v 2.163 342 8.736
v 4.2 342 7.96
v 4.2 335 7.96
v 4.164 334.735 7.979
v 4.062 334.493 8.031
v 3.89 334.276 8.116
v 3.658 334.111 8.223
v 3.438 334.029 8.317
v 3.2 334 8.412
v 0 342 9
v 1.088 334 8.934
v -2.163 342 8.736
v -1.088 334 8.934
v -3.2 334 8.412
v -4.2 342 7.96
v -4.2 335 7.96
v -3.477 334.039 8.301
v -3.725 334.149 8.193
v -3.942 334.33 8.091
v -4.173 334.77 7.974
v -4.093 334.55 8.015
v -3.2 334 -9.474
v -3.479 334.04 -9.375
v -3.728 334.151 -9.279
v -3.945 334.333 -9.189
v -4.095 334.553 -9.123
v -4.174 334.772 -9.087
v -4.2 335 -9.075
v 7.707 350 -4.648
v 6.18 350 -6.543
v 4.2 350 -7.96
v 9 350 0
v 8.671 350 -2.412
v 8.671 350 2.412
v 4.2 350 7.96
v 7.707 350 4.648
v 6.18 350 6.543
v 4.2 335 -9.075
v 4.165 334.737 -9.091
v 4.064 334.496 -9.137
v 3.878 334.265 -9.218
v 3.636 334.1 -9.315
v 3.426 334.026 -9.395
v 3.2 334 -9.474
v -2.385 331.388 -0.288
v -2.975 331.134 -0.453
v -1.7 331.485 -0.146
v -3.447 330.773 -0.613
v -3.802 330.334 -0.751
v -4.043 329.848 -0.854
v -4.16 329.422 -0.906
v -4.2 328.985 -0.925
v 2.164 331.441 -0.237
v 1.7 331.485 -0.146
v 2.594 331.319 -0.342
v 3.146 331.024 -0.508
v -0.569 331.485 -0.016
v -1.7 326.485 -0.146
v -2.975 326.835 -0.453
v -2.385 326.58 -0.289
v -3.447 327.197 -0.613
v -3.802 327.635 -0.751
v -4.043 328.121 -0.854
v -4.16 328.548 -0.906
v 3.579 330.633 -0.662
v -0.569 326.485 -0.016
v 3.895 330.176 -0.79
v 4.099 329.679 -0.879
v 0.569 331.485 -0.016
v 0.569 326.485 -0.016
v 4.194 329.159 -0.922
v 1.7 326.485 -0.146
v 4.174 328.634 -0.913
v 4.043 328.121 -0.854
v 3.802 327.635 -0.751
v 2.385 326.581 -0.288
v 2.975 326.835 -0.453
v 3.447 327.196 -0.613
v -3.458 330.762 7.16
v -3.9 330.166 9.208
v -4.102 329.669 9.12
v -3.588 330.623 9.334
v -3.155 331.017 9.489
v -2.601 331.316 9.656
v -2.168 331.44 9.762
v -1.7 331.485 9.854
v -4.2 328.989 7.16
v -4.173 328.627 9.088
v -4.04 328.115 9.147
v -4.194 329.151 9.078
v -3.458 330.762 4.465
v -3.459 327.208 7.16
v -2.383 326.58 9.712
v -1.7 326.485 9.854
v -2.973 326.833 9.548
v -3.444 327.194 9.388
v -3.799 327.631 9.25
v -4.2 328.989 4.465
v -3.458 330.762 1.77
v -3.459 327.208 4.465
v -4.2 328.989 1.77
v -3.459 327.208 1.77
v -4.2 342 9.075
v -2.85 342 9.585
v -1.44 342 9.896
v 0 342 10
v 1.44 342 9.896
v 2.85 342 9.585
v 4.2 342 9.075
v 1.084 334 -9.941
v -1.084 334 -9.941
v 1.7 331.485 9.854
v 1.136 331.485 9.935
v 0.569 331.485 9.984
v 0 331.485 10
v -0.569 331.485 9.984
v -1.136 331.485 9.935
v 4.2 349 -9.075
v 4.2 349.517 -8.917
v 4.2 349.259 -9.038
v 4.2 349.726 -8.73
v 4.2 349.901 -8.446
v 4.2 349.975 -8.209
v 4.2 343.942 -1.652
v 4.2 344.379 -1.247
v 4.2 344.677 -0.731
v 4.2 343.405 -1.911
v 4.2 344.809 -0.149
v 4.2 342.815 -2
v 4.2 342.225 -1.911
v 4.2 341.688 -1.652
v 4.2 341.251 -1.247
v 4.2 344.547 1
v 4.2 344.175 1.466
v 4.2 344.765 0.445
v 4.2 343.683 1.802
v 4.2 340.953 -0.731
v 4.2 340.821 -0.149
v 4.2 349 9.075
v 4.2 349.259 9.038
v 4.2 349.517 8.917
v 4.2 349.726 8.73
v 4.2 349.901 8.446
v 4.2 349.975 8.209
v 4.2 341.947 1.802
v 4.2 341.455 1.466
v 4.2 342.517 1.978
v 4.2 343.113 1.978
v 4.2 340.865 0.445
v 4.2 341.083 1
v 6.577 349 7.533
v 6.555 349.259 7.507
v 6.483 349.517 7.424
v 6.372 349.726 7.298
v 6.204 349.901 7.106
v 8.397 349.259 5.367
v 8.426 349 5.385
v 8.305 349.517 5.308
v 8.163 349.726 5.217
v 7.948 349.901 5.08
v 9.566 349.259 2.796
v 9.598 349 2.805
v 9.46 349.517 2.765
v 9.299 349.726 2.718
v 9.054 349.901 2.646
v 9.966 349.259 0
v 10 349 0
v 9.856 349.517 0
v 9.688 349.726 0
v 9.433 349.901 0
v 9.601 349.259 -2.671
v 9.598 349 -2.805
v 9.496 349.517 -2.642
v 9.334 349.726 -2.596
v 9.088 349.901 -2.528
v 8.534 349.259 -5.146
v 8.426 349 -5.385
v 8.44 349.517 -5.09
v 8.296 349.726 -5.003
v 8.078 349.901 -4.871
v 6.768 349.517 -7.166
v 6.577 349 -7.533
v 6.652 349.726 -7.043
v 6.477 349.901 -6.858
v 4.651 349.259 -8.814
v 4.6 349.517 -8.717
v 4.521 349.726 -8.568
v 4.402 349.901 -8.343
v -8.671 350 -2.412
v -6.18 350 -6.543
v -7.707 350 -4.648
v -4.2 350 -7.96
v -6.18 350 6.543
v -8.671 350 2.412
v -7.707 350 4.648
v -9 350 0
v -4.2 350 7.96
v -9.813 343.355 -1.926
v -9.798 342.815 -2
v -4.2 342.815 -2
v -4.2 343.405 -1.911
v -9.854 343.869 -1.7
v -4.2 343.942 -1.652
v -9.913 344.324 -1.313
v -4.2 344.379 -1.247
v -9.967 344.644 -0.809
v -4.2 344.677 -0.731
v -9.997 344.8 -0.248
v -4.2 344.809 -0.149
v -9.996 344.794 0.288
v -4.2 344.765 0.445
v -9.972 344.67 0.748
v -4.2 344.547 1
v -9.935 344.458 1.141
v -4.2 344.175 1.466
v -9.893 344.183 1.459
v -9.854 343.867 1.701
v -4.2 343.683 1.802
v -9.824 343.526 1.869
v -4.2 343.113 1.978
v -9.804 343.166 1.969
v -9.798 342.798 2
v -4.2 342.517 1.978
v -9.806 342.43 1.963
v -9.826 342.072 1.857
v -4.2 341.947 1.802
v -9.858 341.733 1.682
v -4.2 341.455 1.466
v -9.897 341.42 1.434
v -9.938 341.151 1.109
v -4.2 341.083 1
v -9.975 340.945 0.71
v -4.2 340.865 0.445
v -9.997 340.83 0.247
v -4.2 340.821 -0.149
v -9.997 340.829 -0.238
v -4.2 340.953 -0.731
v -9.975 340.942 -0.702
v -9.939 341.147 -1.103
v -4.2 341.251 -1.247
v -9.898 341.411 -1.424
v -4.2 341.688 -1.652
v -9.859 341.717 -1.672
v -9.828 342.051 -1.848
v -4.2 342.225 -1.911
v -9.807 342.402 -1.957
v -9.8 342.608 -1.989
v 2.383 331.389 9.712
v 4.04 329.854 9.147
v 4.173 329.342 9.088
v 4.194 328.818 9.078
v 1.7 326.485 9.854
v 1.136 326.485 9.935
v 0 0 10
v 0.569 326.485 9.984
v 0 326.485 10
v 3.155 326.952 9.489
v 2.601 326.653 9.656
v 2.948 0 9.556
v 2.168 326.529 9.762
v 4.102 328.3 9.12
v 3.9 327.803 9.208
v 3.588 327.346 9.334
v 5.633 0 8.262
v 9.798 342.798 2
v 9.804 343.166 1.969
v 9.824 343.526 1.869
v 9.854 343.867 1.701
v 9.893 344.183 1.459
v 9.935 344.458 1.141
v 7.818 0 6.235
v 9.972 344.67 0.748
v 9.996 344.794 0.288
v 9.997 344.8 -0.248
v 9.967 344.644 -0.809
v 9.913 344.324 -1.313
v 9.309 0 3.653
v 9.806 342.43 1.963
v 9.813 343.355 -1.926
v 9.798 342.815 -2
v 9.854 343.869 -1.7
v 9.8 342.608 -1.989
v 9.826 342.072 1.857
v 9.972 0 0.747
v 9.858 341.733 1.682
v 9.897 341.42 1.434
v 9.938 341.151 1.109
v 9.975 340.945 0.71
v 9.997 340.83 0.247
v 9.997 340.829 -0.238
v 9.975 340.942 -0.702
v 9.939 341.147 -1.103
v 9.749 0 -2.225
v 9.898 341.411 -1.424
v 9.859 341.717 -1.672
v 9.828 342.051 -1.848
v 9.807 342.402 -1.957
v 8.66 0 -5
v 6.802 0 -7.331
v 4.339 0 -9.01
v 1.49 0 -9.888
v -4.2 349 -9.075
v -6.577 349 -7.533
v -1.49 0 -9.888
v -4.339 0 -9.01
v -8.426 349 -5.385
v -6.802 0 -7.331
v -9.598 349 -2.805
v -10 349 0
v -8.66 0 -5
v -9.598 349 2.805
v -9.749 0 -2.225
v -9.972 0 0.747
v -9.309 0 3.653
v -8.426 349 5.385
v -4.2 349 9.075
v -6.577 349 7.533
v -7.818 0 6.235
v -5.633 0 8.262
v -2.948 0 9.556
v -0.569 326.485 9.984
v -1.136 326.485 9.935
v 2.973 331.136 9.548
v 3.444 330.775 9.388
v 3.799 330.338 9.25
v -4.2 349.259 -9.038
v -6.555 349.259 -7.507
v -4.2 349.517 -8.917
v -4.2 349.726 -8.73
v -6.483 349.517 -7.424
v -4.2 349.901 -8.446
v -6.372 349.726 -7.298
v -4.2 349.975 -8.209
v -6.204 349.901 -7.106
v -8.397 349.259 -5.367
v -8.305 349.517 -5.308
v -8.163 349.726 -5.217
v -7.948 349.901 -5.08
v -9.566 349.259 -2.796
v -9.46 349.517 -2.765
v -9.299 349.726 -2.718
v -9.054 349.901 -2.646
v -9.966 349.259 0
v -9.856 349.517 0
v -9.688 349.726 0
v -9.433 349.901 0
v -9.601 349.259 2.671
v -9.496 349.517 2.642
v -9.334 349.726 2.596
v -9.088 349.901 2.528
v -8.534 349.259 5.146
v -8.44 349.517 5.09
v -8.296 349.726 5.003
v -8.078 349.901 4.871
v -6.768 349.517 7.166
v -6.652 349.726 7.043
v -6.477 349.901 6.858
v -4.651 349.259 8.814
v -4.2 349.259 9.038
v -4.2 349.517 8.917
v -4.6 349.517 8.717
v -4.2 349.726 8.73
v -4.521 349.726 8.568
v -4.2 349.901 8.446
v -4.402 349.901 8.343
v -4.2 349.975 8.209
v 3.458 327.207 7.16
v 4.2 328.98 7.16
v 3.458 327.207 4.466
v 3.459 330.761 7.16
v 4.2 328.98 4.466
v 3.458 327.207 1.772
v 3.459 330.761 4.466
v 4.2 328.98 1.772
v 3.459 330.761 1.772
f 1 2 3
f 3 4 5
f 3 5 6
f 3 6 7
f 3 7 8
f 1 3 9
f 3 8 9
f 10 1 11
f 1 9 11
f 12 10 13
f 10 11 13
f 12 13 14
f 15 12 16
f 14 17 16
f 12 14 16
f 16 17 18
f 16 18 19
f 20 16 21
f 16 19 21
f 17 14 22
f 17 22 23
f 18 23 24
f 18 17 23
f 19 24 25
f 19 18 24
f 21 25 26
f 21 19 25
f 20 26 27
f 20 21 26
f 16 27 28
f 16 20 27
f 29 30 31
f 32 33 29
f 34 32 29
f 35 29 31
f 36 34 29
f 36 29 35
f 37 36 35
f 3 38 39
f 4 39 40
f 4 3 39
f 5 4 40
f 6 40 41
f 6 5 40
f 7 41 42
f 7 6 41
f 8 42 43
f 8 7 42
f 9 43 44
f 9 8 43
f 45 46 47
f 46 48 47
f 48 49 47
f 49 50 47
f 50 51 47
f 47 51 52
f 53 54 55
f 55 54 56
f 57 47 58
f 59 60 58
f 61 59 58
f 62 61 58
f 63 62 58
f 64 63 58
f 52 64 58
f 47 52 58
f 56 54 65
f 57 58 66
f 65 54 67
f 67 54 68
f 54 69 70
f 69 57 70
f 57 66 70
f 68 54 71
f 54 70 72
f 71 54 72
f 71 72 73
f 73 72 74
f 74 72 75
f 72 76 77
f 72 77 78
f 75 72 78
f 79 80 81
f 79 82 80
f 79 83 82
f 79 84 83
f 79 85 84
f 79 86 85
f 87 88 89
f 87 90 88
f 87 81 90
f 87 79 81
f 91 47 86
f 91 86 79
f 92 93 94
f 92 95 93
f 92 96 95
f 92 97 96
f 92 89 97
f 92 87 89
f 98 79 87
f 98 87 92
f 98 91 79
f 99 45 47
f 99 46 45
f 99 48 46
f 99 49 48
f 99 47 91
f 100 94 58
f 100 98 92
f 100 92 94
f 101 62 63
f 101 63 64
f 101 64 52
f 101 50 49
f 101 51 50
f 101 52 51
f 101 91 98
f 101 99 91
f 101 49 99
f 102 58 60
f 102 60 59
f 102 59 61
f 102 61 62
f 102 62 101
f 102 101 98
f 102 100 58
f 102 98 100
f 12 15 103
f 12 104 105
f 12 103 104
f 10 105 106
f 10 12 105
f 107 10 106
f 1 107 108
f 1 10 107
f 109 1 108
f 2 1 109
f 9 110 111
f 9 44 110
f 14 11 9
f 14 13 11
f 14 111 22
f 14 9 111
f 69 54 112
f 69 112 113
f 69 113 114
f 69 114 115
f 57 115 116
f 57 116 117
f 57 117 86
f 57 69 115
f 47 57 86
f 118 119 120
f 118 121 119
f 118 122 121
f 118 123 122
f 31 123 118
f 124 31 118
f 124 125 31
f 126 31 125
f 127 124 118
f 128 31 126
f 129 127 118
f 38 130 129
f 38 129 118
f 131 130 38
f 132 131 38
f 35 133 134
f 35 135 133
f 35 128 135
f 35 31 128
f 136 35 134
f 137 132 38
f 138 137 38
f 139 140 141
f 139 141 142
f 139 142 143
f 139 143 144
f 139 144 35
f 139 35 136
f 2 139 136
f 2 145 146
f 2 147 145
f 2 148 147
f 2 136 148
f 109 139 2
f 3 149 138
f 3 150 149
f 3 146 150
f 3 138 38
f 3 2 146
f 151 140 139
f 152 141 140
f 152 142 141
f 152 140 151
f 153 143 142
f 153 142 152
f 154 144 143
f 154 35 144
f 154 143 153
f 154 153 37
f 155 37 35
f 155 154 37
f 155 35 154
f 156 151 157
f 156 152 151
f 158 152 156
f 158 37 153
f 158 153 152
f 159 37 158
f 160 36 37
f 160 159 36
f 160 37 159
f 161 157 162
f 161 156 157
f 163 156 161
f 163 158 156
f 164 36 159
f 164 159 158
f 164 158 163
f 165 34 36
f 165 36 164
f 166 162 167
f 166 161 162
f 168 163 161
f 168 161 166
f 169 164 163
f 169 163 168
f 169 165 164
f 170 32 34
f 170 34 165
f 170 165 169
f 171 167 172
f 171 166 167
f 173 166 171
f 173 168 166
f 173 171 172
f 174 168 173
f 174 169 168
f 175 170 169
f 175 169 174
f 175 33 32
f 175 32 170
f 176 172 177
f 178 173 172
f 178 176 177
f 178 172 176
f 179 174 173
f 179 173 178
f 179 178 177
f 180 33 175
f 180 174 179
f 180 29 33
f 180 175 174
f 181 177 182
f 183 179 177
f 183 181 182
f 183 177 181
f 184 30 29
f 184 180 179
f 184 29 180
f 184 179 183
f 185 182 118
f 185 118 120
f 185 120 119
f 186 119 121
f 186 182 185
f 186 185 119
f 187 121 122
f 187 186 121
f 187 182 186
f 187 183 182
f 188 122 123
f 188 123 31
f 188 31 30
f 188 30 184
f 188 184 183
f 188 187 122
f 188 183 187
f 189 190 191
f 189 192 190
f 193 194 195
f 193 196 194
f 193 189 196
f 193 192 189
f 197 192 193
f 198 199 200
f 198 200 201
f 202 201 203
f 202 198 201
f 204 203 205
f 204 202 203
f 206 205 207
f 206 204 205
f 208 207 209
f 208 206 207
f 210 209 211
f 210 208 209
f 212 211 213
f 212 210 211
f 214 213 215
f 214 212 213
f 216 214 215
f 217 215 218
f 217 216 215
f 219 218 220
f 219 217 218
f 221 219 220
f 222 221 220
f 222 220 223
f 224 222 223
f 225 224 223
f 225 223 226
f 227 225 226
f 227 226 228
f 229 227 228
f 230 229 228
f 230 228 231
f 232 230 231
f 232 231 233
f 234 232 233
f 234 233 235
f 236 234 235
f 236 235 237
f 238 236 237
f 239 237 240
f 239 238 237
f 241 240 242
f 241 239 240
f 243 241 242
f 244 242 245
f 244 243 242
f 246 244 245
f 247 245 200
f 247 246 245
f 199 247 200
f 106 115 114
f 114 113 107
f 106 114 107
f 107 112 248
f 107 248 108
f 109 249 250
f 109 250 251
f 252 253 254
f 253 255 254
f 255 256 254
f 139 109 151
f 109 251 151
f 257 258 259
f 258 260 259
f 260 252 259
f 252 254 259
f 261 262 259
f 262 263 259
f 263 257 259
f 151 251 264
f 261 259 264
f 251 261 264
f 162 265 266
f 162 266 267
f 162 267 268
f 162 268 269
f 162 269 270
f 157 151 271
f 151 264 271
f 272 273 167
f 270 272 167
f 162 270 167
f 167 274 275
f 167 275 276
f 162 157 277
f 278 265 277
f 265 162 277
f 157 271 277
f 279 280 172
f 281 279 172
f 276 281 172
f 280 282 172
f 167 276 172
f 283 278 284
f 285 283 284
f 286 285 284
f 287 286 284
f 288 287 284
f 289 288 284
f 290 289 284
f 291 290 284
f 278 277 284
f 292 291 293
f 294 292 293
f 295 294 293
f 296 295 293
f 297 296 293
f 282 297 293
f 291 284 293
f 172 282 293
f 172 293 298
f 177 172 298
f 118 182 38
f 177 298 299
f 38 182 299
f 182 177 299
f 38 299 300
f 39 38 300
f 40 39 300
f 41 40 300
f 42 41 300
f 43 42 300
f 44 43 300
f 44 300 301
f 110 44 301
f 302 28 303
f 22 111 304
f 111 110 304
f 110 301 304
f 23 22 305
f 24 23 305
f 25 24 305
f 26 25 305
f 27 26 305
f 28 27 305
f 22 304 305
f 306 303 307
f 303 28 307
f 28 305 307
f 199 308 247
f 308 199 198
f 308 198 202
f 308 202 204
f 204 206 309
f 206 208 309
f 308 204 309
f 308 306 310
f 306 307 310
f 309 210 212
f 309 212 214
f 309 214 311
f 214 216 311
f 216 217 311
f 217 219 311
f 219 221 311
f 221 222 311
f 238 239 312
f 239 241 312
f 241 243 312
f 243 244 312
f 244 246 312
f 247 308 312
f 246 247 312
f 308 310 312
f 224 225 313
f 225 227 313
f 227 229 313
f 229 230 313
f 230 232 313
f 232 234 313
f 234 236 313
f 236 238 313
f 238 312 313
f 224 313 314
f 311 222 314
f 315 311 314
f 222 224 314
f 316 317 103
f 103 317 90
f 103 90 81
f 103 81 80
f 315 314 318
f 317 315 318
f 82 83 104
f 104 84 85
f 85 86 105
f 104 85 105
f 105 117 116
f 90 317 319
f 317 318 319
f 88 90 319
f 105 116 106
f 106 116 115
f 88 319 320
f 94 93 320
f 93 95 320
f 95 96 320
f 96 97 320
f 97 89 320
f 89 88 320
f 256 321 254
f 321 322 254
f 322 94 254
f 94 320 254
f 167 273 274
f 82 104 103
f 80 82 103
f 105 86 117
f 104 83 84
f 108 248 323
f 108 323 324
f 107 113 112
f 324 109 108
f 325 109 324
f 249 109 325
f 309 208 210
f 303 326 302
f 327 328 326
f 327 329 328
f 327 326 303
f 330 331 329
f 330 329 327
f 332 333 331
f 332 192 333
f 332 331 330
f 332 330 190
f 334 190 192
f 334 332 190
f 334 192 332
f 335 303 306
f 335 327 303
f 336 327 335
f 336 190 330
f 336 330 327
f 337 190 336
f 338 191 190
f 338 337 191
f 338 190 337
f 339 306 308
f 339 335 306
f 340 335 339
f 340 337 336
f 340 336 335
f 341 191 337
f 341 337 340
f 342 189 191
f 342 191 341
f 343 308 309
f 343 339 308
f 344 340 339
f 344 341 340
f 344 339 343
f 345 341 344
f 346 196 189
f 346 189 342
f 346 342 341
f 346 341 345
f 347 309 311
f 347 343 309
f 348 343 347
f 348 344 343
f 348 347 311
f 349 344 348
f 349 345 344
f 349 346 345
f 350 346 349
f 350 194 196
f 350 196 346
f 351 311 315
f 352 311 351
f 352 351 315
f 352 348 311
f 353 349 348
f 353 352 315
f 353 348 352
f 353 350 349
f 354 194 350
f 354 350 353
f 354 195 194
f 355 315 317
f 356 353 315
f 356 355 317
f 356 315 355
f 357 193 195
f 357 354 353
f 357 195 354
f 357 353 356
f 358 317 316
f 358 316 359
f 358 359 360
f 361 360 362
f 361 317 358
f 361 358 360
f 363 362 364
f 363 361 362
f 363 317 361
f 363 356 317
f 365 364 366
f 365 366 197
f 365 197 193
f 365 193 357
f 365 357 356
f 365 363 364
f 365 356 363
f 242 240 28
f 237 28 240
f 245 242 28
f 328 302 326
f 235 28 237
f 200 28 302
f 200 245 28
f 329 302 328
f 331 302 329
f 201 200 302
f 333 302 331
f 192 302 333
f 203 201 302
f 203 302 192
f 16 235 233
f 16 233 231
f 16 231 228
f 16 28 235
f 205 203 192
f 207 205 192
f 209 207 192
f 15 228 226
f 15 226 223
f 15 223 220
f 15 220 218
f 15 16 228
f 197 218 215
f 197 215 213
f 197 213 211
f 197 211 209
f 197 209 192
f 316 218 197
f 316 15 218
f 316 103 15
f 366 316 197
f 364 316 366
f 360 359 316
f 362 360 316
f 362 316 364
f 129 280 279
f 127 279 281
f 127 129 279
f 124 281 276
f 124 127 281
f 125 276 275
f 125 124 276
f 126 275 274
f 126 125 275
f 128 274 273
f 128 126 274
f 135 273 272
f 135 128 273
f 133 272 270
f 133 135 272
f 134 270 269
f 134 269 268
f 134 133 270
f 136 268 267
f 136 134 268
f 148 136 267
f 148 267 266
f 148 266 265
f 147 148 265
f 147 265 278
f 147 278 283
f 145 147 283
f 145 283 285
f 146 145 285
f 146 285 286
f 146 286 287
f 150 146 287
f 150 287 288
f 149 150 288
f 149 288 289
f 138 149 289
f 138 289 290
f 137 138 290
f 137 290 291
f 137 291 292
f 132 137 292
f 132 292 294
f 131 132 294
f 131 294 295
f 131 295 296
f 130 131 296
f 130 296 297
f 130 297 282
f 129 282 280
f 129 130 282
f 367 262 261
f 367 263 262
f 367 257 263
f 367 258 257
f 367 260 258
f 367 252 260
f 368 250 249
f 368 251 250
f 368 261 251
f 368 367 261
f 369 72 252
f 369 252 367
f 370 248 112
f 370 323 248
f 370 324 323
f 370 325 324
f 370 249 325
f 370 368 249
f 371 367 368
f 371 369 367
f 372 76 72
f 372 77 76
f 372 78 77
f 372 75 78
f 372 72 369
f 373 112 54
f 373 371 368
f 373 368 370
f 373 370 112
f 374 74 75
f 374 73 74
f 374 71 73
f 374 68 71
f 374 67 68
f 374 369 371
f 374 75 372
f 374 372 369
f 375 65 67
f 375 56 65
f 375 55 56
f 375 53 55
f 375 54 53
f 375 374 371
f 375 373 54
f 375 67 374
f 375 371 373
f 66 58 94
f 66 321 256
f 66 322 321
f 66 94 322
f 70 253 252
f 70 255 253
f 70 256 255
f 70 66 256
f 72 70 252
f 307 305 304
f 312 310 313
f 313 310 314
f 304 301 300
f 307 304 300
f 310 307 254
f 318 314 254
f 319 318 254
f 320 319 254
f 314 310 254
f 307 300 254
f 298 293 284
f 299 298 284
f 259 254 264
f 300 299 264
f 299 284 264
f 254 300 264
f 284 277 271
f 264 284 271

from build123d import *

# Parameters (mm, degrees)
SKETCH_1_R                           = 10
EXTRUDE_1_DEPTH                      = 350
FILLET_1_R                           = 1
CUT_EXTRUDE_6_DEPTH                  = 351.285597766
CUT_EXTRUDE_6_DIRECTION_2_REACH      = 352.286
CUT_EXTRUDE_6_DIRECTION_2_END_RADIUS = 9
CUT_EXTRUDE_7_DEPTH                  = 351.285597868
CUT_EXTRUDE_7_DEPTH_BACK             = 351.285597868
SKETCH_7_W                           = 8.4
SKETCH_7_H                           = 16
CUT_EXTRUDE_START                    = -0.924758876
CUT_EXTRUDE_8_DEPTH                  = 11.924758876
CUT_EXTRUDE_START_2                  = 325
CUT_EXTRUDE_8_2_DEPTH                = 7
CUT_EXTRUDE_9_DEPTH                  = 351.285597868
CUT_EXTRUDE_9_DEPTH_BACK             = 351.285597868
SKETCH_9_R                           = 2


with BuildPart() as part:
    # 草图1 → 凸台-拉伸1 (new body)
    with BuildSketch(Plane(origin=(0, 0, 0), x_dir=(1, 0, 0), z_dir=(0, 1, 0))):
        with Locations(Location((0, 0, 0), (0, 0, 270))):
            Circle(SKETCH_1_R)
    extrude(amount=EXTRUDE_1_DEPTH)

    # 圆角1
    fillet_1_edges = [part.edges().sort_by_distance(p)[0] for p in [
        (0, 350, -10),
    ]]
    fillet(fillet_1_edges, radius=FILLET_1_R)

    # 草图5 → 切除-拉伸6 (cut)
    with BuildSketch(Plane.XY):
        with BuildLine():
            Line((3.2, 334), (-3.2, 334))
            ThreePointArc((-3.2, 334), (-3.907106781, 334.292893219), (-4.2, 335))
            Line((-4.2, 335), (-4.2, 366))
            Line((-4.2, 366), (4.2, 366))
            Line((4.2, 366), (4.2, 335))
            ThreePointArc((4.2, 335), (3.907106781, 334.292893219), (3.2, 334))
        make_face()
    extrude(amount=-CUT_EXTRUDE_6_DEPTH, mode=Mode.SUBTRACT)

    # 切除-拉伸6 direction 2: up to this cylinder (the profile starts inside it)
    cut_extrude_6_direction_2_end = Plane(origin=(0, 350.025231, 0), z_dir=(0, -1, 0)) * Cylinder(CUT_EXTRUDE_6_DIRECTION_2_END_RADIUS, 723.572, mode=Mode.PRIVATE)
    # 草图5 → 切除-拉伸6 direction 2 (cut, up to the surface)
    with BuildSketch(Plane.XY, mode=Mode.PRIVATE) as cut_extrude_6_direction_2_sk1:
        with BuildLine():
            Line((3.2, 334), (-3.2, 334))
            ThreePointArc((-3.2, 334), (-3.907106781, 334.292893219), (-4.2, 335))
            Line((-4.2, 335), (-4.2, 366))
            Line((-4.2, 366), (4.2, 366))
            Line((4.2, 366), (4.2, 335))
            ThreePointArc((4.2, 335), (3.907106781, 334.292893219), (3.2, 334))
        make_face()
    cut_extrude_6_direction_2_tool1 = extrude(cut_extrude_6_direction_2_sk1.sketch, amount=CUT_EXTRUDE_6_DIRECTION_2_REACH, mode=Mode.PRIVATE) & cut_extrude_6_direction_2_end
    add(cut_extrude_6_direction_2_tool1.solids().sort_by_distance((0, 350.025231, 0))[0], mode=Mode.SUBTRACT)

    # 草图7 → 切除-拉伸7 (cut, two sides: drawn at the far end of the back side and taken through both)
    with BuildSketch(Plane.XY.offset(-CUT_EXTRUDE_7_DEPTH_BACK)):
        with Locations((0, 350)):
            Rectangle(SKETCH_7_W, SKETCH_7_H)
    extrude(amount=CUT_EXTRUDE_7_DEPTH + CUT_EXTRUDE_7_DEPTH_BACK, mode=Mode.SUBTRACT)

    # 切除-拉伸8: read off the stored shape, not the designer's step
    # 切除-拉伸8 outline → 切除-拉伸8 (cut)
    with BuildSketch(Plane.XY.offset(CUT_EXTRUDE_START)):
        with BuildLine():
            Line((1.7, 331.484532172), (-1.7, 331.484532172))
            add(Edge.make_bspline(
                [(-1.7, 331.484532172), (-2.36531519, 331.484532172), (-2.999142714, 331.215697613), (-3.916295952, 330.308882303), (-4.198882198, 329.654063239), (-4.20111079, 328.323374921), (-3.920415307, 327.665006461), (-2.997944529, 326.751432928), (-2.365478889, 326.484532172), (-1.7, 326.484532172)],
                knots=[0, 0, 0, 0, 0.25, 0.25, 0.5, 0.5, 0.75, 0.75, 1, 1, 1, 1], degree=3))
            Line((-1.7, 326.484532172), (1.7, 326.484532172))
            add(Edge.make_bspline(
                [(1.7, 326.484532172), (2.36531519, 326.484532172), (2.999142714, 326.75336673), (3.916295952, 327.66018204), (4.198882198, 328.315001104), (4.20111079, 329.645689422), (3.920415307, 330.304057882), (2.997944529, 331.217631415), (2.365478889, 331.484532172), (1.7, 331.484532172)],
                knots=[0, 0, 0, 0, 0.25, 0.25, 0.5, 0.5, 0.75, 0.75, 1, 1, 1, 1], degree=3))
        make_face()
    extrude(amount=CUT_EXTRUDE_8_DEPTH, mode=Mode.SUBTRACT)

    # Cut-Extrude 8 2 outline → Cut-Extrude 8 2 (add)
    with BuildSketch(Plane(origin=(0, 0, 0), x_dir=(1, 0, 0), z_dir=(0, 1, 0)).offset(CUT_EXTRUDE_START_2)):
        with BuildLine():
            ThreePointArc((-4.199999886, 0.924758903), (0, 0), (4.199999886, 0.924758903))
            Line((4.199999886, 0.924758903), (-4.199999886, 0.924758903))
        make_face()
    extrude(amount=CUT_EXTRUDE_8_2_DEPTH)

    # 草图9 → 切除-拉伸9 (cut, two sides: drawn at the far end of the back side and taken through both)
    with BuildSketch(Plane(origin=(0, 0, 0), x_dir=(0, 0, -1), z_dir=(1, 0, 0)).offset(-CUT_EXTRUDE_9_DEPTH_BACK)):
        with Locations((0, 342.814995951)):
            Circle(SKETCH_9_R)
    extrude(amount=CUT_EXTRUDE_9_DEPTH + CUT_EXTRUDE_9_DEPTH_BACK, mode=Mode.SUBTRACT)


solid = part.part
